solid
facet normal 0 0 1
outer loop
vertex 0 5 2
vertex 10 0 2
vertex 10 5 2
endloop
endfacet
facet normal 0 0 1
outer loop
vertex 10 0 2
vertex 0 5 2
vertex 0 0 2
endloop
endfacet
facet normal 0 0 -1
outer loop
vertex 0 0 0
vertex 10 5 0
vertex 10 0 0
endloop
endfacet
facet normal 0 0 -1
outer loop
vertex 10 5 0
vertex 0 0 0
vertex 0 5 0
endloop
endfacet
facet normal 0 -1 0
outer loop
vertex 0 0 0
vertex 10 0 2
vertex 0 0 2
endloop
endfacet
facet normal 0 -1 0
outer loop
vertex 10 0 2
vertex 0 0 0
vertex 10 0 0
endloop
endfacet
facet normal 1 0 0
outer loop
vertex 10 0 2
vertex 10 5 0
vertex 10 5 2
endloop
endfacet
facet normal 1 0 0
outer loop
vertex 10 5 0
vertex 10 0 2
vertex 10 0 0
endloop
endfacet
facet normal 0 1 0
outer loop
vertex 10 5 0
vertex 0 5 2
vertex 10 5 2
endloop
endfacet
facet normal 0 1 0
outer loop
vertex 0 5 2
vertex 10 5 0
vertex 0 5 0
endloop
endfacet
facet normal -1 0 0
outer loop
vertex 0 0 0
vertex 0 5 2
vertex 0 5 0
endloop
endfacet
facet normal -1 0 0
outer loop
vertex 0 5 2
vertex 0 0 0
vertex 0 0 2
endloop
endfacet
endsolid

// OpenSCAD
module box(width, depth, height) {
  cube([width, depth, height]);
}

box(10, 5, 2);
